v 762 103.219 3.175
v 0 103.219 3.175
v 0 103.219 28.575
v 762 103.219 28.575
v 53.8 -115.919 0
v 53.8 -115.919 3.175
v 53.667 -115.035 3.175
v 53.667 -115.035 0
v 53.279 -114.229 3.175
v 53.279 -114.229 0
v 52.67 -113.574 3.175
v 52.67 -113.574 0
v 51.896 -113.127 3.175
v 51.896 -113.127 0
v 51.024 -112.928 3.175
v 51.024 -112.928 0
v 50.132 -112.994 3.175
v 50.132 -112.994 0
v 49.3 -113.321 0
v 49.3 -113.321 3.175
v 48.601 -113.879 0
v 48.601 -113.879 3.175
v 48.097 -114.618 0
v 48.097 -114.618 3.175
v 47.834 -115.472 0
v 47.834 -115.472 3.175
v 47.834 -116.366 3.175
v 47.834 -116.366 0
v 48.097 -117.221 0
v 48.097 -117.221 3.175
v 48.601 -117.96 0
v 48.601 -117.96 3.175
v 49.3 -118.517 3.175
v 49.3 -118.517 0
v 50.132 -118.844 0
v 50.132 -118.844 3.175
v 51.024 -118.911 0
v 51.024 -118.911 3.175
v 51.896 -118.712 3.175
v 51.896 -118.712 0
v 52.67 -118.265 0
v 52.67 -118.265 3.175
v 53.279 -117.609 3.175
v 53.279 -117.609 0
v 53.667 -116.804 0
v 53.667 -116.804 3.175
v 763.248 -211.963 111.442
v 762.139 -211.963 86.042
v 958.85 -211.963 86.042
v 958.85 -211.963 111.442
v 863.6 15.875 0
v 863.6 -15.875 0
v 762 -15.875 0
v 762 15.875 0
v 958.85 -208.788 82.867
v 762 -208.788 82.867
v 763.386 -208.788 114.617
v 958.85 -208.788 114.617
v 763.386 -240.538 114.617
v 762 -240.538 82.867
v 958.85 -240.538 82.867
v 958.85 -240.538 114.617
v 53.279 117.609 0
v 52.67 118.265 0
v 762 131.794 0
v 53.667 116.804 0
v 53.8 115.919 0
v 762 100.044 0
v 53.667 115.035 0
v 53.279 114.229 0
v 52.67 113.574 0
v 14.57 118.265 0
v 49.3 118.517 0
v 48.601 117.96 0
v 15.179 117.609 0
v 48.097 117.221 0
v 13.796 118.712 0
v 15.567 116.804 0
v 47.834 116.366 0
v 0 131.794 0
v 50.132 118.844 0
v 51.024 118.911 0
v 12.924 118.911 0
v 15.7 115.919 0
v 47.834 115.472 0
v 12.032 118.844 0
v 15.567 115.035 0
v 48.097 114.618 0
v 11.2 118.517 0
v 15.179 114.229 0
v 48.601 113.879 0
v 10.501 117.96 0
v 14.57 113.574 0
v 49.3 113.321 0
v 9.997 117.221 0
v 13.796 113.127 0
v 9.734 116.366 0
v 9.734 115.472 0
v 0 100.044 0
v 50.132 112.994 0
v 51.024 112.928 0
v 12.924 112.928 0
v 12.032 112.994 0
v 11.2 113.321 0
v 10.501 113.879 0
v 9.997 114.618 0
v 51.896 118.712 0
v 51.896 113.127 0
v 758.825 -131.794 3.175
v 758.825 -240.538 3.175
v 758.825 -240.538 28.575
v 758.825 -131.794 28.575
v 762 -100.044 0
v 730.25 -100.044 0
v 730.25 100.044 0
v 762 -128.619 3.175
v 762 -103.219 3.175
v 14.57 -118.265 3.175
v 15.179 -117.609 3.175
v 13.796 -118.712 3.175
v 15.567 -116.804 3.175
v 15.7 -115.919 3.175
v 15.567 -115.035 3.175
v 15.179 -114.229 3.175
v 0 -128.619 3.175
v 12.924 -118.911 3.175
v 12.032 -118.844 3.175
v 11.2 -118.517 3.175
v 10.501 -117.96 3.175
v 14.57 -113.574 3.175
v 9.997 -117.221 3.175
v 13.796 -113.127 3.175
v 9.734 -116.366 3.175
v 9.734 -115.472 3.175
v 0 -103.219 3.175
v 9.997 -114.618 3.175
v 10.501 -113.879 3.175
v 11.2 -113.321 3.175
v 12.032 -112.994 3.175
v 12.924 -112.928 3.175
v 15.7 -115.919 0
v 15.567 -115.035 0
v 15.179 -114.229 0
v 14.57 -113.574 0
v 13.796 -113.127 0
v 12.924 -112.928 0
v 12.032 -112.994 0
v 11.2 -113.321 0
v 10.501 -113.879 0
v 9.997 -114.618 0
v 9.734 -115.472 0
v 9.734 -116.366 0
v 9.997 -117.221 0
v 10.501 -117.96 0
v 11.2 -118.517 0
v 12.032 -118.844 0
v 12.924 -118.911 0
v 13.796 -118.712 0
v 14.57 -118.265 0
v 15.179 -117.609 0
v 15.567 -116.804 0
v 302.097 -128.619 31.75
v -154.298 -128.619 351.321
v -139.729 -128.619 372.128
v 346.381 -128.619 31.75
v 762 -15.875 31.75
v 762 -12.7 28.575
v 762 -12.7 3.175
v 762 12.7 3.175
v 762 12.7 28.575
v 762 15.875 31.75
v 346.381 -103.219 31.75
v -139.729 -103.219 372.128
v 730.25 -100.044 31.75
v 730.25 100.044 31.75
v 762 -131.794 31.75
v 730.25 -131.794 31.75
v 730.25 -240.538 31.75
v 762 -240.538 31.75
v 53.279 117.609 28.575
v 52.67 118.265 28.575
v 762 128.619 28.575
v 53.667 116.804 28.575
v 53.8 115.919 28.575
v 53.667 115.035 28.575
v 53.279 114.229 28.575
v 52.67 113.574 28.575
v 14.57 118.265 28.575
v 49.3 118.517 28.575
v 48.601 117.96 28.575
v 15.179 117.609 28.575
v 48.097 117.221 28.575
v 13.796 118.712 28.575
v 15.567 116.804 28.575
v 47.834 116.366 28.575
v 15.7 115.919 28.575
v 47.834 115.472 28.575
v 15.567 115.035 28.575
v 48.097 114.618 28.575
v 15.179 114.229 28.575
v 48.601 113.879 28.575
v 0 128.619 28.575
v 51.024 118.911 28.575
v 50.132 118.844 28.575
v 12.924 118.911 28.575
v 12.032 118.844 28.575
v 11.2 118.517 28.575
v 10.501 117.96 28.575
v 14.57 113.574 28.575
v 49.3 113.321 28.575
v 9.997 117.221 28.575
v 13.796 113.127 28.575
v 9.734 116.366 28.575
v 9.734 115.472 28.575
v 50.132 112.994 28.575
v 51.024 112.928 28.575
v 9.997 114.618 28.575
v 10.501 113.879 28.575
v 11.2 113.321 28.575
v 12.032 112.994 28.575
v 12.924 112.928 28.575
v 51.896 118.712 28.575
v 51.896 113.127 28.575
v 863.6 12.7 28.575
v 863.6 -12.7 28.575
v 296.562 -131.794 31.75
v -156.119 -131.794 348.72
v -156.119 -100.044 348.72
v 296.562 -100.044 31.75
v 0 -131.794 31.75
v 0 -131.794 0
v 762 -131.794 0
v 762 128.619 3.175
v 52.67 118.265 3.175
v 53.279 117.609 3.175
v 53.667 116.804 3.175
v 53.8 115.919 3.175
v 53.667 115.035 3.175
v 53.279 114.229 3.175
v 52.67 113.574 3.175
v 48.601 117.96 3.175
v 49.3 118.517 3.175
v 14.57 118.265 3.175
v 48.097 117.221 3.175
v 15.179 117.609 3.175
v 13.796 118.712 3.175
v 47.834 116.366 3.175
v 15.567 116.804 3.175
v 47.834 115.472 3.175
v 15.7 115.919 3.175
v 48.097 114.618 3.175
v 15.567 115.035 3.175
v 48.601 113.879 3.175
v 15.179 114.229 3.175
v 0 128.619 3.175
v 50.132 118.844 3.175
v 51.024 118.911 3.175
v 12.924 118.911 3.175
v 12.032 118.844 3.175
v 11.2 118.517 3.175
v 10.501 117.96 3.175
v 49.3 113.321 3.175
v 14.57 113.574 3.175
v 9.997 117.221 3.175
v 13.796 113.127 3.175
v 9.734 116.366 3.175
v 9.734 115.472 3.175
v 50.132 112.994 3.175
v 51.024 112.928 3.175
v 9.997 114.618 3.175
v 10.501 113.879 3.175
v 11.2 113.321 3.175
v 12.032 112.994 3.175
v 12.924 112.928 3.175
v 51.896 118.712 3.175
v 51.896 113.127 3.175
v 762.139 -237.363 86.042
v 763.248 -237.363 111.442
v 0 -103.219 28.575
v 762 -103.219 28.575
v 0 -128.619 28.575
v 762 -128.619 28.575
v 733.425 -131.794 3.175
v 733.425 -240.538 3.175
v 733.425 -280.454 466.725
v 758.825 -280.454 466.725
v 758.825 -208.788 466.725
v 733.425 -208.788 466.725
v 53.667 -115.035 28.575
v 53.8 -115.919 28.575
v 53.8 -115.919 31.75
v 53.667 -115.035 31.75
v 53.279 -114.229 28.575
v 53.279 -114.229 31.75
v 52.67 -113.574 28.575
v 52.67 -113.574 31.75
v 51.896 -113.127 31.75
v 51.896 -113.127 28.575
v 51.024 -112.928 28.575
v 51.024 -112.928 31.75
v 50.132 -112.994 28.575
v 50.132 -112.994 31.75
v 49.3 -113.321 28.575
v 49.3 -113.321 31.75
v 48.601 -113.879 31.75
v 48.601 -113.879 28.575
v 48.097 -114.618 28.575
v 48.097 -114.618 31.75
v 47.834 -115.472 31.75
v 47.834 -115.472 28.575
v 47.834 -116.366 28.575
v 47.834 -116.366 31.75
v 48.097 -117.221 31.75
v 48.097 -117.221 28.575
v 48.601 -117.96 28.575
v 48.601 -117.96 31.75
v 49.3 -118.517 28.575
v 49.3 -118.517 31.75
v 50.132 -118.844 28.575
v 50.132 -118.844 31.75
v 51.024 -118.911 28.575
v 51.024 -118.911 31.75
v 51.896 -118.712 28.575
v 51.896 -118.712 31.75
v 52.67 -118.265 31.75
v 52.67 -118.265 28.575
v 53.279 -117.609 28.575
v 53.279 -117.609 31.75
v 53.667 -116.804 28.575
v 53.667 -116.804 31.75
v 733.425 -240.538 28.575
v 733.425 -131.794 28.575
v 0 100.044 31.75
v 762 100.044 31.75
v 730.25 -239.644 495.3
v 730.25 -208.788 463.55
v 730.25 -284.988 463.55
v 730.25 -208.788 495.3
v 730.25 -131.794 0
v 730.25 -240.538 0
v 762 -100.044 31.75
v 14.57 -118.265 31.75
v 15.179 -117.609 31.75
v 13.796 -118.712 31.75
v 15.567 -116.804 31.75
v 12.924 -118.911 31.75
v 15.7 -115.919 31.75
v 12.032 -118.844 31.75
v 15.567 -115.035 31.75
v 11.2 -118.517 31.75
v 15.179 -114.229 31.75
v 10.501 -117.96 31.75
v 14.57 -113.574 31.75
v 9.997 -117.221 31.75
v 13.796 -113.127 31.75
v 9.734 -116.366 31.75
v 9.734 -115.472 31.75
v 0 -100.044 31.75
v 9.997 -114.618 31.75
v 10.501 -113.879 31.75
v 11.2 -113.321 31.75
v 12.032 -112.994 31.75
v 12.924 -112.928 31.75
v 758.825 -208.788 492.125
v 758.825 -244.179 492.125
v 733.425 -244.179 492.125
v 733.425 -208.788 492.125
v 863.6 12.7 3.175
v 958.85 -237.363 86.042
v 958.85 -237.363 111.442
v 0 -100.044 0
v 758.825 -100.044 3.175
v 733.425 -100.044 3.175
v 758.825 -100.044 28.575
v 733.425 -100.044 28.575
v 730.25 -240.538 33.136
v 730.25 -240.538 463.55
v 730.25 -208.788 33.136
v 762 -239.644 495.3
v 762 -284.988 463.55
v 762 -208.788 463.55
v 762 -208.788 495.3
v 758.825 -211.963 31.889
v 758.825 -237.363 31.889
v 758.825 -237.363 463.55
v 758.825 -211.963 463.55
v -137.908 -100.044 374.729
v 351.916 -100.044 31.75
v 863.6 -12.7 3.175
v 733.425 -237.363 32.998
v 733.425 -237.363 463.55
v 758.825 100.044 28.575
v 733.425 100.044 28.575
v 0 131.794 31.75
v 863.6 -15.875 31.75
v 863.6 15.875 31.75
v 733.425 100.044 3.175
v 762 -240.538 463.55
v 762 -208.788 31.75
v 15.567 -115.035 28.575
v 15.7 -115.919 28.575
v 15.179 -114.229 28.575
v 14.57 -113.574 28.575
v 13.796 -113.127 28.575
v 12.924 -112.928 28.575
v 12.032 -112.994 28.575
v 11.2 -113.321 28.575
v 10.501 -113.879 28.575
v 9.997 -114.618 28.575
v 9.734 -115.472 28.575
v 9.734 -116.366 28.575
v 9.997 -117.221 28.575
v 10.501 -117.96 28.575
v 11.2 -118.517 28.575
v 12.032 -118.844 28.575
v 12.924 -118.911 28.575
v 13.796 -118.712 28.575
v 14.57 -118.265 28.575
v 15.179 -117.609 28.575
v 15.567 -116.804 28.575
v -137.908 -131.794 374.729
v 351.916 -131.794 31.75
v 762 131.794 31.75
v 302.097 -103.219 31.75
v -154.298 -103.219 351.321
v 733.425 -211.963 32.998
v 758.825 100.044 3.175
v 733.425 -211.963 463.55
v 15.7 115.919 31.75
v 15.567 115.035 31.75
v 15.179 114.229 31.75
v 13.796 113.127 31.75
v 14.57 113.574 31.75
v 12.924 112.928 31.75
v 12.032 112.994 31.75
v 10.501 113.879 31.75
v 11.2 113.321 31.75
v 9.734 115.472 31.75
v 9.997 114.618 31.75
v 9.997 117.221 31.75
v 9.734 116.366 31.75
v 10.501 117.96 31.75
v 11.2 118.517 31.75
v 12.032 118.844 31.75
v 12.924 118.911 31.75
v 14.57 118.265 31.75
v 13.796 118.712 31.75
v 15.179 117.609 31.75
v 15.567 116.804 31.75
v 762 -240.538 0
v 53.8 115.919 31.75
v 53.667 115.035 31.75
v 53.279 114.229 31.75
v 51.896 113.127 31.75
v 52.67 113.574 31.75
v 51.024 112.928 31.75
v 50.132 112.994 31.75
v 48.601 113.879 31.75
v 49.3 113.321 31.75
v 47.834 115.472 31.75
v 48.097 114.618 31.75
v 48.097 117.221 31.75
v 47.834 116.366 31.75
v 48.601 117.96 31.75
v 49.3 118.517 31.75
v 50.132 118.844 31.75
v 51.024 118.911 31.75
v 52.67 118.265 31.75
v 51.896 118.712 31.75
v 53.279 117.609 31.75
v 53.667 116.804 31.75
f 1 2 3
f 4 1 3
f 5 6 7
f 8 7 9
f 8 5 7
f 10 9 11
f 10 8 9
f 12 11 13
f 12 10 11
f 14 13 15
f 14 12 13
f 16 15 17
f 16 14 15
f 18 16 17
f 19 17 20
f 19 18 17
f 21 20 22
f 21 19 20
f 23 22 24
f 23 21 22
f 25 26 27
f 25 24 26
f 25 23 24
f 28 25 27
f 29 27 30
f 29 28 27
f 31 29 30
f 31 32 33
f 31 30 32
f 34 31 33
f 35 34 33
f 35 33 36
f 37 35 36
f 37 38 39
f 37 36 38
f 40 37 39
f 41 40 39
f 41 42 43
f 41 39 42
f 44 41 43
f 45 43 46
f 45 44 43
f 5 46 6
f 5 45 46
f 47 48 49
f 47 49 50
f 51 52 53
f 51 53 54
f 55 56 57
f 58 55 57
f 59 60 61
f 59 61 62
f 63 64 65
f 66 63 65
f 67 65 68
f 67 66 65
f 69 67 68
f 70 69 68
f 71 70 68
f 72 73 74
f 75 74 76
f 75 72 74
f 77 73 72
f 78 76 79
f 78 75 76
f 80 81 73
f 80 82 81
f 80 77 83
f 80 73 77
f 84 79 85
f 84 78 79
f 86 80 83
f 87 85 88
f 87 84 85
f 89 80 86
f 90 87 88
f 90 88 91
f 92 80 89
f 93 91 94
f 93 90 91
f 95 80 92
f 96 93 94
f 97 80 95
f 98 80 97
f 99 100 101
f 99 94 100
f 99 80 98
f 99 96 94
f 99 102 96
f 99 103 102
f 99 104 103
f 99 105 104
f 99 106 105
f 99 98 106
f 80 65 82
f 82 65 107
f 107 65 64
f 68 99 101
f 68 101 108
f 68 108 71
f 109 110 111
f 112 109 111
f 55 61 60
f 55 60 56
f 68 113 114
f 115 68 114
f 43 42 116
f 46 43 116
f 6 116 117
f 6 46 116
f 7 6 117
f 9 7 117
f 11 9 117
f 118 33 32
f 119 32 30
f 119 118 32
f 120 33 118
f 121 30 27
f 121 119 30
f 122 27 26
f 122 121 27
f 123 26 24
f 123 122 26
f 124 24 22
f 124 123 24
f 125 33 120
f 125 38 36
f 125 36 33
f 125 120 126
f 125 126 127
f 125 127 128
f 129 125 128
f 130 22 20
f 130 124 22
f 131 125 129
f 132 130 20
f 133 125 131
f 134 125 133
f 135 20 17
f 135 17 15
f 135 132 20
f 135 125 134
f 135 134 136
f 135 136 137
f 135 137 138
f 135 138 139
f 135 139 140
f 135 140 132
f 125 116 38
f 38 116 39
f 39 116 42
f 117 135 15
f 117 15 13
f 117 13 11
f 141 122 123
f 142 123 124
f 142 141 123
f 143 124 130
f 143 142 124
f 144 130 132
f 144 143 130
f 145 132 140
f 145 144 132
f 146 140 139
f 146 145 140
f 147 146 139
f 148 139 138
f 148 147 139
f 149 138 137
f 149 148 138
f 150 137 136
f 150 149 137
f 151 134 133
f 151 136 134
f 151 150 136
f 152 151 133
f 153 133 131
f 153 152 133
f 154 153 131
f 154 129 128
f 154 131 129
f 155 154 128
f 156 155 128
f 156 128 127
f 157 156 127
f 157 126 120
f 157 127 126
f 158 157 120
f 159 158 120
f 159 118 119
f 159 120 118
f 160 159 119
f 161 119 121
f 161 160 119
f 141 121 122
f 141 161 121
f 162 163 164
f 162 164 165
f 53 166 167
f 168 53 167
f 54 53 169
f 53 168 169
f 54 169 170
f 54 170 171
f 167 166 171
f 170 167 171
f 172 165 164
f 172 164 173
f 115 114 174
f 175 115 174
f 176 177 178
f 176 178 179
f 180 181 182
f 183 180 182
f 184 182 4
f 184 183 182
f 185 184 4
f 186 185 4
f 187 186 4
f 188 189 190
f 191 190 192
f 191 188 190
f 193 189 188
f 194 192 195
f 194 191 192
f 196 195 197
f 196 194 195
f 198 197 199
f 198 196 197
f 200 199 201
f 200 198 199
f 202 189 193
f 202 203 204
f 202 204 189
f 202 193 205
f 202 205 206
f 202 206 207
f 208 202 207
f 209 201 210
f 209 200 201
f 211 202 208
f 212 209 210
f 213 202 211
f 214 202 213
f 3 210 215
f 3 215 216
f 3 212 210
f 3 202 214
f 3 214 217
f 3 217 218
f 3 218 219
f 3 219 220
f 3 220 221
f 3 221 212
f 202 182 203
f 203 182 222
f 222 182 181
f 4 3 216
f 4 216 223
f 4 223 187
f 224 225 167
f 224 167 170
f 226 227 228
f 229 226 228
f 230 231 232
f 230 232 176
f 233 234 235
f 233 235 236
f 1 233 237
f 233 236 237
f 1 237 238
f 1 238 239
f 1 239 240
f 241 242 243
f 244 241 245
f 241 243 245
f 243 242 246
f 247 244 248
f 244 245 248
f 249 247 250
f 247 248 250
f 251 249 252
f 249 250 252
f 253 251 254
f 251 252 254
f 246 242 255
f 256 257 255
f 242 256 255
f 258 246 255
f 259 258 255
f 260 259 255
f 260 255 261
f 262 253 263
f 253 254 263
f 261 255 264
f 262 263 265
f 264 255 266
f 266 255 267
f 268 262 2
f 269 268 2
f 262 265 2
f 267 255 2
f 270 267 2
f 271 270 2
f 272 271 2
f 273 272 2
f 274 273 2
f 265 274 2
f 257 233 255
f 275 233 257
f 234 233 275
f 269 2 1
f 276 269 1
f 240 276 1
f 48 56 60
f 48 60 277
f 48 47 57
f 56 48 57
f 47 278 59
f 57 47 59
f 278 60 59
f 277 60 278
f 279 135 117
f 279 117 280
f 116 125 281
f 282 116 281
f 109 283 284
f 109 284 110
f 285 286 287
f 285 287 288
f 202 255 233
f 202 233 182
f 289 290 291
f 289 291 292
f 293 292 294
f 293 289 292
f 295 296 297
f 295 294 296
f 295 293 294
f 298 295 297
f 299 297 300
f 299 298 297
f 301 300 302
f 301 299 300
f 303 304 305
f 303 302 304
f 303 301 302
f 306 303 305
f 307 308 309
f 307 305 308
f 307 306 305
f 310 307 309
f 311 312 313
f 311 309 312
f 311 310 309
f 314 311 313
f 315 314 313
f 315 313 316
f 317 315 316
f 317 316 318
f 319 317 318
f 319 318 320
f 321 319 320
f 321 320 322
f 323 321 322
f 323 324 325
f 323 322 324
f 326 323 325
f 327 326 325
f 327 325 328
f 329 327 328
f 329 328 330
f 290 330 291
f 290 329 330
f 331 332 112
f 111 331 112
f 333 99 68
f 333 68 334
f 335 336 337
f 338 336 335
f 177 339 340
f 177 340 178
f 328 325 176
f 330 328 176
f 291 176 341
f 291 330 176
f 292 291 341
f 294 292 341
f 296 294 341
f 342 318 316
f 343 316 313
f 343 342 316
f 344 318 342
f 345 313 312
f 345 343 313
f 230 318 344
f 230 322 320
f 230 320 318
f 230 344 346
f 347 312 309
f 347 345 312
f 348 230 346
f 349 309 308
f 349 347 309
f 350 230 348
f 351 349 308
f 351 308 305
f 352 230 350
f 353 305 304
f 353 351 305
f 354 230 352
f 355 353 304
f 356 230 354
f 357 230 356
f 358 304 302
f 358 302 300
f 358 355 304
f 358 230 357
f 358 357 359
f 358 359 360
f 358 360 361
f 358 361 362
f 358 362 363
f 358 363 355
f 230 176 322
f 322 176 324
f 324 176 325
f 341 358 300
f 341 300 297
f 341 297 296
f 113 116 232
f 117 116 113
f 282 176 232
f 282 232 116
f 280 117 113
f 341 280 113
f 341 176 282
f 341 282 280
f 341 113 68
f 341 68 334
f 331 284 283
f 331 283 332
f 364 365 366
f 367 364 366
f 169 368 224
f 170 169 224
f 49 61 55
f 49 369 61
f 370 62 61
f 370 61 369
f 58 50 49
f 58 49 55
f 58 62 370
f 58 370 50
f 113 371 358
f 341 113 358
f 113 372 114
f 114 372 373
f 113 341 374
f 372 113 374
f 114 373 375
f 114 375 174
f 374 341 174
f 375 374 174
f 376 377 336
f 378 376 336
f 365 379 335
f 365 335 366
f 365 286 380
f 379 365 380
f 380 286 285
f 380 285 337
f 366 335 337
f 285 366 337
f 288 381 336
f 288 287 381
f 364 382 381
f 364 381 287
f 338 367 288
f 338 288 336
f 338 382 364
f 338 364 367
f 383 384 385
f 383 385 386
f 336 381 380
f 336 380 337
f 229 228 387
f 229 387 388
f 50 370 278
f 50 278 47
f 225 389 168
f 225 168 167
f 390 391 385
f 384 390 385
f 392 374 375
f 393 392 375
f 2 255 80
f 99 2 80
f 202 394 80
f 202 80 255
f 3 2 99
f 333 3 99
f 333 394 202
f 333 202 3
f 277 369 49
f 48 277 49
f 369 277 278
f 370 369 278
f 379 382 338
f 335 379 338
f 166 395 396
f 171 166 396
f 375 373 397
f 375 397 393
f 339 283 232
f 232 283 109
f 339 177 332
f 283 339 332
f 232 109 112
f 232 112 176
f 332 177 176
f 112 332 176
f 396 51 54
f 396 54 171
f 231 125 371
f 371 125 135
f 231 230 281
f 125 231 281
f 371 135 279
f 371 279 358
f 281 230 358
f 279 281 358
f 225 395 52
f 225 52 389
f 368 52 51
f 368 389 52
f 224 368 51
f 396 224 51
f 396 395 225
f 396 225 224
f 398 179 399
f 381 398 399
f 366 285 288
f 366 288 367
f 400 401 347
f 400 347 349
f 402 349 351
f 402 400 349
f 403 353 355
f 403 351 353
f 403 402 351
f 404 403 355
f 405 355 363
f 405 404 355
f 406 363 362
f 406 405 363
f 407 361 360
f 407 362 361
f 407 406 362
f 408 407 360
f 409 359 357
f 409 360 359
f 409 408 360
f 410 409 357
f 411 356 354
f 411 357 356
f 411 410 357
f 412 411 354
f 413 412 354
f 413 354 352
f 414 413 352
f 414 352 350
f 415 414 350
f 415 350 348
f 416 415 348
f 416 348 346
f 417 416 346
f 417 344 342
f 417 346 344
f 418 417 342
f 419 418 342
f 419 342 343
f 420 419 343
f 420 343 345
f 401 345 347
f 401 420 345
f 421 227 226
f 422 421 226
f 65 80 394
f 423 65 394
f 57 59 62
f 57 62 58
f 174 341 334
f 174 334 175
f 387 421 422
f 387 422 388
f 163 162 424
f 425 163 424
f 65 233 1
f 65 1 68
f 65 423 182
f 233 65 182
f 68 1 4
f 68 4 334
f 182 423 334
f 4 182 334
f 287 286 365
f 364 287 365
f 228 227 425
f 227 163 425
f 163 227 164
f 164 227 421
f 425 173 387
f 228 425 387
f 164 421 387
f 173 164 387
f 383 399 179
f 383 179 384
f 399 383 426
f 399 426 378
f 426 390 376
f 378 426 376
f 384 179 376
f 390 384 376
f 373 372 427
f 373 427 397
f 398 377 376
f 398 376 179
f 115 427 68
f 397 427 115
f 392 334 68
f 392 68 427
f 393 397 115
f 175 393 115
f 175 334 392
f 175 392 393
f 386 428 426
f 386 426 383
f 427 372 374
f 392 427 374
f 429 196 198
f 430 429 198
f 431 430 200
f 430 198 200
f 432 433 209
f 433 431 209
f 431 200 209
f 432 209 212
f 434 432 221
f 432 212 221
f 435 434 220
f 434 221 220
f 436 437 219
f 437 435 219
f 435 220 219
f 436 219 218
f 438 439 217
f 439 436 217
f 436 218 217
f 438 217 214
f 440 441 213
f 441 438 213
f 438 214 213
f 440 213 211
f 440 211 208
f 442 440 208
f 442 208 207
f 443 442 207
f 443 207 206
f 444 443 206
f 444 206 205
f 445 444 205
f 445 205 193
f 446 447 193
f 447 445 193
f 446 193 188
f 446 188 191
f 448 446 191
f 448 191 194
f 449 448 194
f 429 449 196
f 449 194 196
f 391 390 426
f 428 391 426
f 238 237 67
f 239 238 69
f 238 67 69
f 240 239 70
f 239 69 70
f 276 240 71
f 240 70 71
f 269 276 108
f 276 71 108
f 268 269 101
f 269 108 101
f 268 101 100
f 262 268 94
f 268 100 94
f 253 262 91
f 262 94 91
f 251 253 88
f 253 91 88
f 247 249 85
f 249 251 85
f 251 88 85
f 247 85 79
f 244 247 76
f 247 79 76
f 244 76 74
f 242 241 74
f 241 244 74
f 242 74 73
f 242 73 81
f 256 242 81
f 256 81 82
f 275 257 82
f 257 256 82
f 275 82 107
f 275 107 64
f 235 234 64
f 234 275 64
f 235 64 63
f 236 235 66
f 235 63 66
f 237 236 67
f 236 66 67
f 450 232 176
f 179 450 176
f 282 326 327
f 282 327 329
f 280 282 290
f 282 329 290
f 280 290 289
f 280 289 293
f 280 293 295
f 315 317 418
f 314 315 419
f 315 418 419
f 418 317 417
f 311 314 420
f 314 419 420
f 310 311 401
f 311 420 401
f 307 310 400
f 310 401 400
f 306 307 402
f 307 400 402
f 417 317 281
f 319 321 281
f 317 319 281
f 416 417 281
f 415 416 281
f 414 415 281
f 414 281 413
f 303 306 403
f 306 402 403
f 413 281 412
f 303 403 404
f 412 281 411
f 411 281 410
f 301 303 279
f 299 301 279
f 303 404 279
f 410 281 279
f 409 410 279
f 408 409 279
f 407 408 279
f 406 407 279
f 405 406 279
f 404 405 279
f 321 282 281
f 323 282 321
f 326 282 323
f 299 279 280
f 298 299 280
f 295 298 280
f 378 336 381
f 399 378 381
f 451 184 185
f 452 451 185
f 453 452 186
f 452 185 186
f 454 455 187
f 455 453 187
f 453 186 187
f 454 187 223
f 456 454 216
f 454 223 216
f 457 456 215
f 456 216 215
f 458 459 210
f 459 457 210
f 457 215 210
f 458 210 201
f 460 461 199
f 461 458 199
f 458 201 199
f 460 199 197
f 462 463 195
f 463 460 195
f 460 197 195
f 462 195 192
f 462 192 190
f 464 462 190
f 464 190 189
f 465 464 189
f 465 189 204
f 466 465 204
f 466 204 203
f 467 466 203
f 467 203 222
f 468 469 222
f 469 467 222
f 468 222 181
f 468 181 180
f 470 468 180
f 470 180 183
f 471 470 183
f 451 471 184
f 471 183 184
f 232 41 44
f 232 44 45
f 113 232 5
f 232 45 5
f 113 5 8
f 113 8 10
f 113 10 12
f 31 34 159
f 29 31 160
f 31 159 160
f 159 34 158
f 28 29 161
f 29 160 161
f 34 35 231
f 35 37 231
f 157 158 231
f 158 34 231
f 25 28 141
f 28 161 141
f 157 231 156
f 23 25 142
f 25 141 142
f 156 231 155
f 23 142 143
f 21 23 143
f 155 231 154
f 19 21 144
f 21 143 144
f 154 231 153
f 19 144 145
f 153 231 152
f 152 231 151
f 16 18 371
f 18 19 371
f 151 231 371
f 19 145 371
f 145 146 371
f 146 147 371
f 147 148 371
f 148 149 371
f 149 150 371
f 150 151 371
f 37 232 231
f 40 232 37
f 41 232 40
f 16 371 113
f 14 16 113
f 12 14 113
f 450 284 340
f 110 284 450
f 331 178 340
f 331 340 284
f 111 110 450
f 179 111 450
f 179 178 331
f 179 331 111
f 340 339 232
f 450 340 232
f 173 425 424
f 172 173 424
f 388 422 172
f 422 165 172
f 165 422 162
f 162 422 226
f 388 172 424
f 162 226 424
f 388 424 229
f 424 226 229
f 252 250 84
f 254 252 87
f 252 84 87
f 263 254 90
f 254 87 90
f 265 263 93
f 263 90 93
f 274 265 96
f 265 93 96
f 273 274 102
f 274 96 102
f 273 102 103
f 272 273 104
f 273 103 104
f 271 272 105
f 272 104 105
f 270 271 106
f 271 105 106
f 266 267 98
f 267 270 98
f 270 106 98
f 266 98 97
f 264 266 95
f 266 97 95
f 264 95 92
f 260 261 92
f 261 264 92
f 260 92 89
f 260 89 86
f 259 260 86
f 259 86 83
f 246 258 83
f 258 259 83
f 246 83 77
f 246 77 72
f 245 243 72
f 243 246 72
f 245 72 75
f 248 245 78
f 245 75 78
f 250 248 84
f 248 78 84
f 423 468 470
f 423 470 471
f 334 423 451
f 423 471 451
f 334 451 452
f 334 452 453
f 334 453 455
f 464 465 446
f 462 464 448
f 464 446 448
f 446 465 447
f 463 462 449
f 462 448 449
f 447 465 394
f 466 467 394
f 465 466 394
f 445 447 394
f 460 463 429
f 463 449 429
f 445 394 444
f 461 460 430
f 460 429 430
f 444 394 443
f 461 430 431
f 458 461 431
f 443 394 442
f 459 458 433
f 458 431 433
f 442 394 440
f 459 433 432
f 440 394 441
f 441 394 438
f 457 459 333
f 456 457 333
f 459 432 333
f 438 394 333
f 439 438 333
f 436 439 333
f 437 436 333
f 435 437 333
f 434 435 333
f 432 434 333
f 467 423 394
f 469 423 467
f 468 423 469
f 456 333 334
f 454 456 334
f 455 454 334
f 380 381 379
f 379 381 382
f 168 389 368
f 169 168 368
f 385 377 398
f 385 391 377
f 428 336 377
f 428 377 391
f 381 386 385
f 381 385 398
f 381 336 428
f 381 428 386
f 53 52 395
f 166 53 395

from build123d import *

# Parameters (mm, degrees)
F0_W      = 31.75
F0_H      = 31.75
F0_W_2    = 25.4
F0_H_2    = 25.4
F1_DEPTH  = 762
F2_R      = 3
F3_DEPTH  = 31.751
F5_W      = 31.75
F5_H      = 31.75
F5_W_2    = 25.4
F5_H_2    = 25.4
F6_DEPTH  = 200.0885
F7_W      = 31.75
F7_H      = 31.75
F7_W_2    = 25.4
F7_H_2    = 25.4
F8_DEPTH  = 101.6
F9_W      = 31.75
F9_H      = 31.75
F9_W_2    = 25.4
F9_H_2    = 25.4
F10_DEPTH = 108.74375
F11_W     = 31.75
F11_H     = 31.75
F11_W_2   = 25.4
F11_H_2   = 25.4
F12_DEPTH = 431.8
F14_DEPTH = 60.706
F15_W     = 31.75
F15_H     = 31.75
F15_W_2   = 25.4
F15_H_2   = 25.4
F16_DEPTH = 76.2
F18_DEPTH = 133.351
F20_W     = 31.75
F20_H     = 31.75
F20_W_2   = 25.4
F20_H_2   = 25.4
F21_DEPTH = 196.85
F23_DEPTH = 41.402
F25_W     = 31.75
F25_H     = 31.75
F25_W_2   = 25.4
F25_H_2   = 25.4


with BuildPart() as f1:
    # F0 (on Right) → F1 (new body)
    with BuildSketch(Plane.YZ):
        with Locations((-115.91925, 15.875)):
            Rectangle(F0_W, F0_H)
        with Locations((-115.91925, 15.875)):
            Rectangle(F0_W_2, F0_H_2, mode=Mode.SUBTRACT)
    extrude(amount=F1_DEPTH)

    # F2 (on Top) → F3 (cut, through all)
    with BuildSketch(Plane.XY):
        with Locations((12.7, -115.91925)):
            Circle(F2_R)
        with Locations((50.8, -115.91925)):
            Circle(F2_R)
    extrude(amount=F3_DEPTH, mode=Mode.SUBTRACT)


with BuildPart() as f4_1:
    # F4: instance of F1
    add(f1.part.mirror(Plane.XZ))


with BuildPart() as f6:
    # F5 (on face) → F6 (new body, through all)
    with BuildSketch(Plane(origin=(0, -100.04425, 0), x_dir=(-1, 0, 0), z_dir=(0, 1, 0))):
        with Locations((-746.125, 15.875)):
            Rectangle(F5_W, F5_H)
        with Locations((-746.125, 15.875)):
            Rectangle(F5_W_2, F5_H_2, mode=Mode.SUBTRACT)
    extrude(amount=F6_DEPTH)


with BuildPart() as f8:
    # F7 (on face) → F8 (new body)
    with BuildSketch(Plane.YZ.offset(762)):
        with Locations((0, 15.875)):
            Rectangle(F7_W, F7_H)
        with Locations((0, 15.875)):
            Rectangle(F7_W_2, F7_H_2, mode=Mode.SUBTRACT)
    extrude(amount=F8_DEPTH)


with BuildPart() as f10:
    # F9 (on face) → F10 (new body)
    with BuildSketch(Plane.XZ.offset(131.79425)):
        with Locations((746.125, 15.875)):
            Rectangle(F9_W, F9_H)
        with Locations((746.125, 15.875)):
            Rectangle(F9_W_2, F9_H_2, mode=Mode.SUBTRACT)
    extrude(amount=F10_DEPTH)


with BuildPart() as f12:
    # F11 (on face) → F12 (new body)
    with BuildSketch(Plane.XY.offset(31.75)):
        with Locations((746.125, -224.663)):
            Rectangle(F11_W, F11_H)
        with Locations((746.125, -224.663)):
            Rectangle(F11_W_2, F11_H_2, mode=Mode.SUBTRACT)
    extrude(amount=F12_DEPTH)

    # F13 (on face) → F14 (cut)
    with BuildSketch(Plane.XZ.offset(240.538)):
        Polygon((730.25, 31.75), (762, 31.75), (730.25, 33.1362349373), align=None)
    extrude(amount=-F14_DEPTH, mode=Mode.SUBTRACT)


with BuildPart() as f16:
    # F15 (on face) → F16 (new body)
    with BuildSketch(Plane(origin=(0, -208.788, 0), x_dir=(-1, 0, 0), z_dir=(0, 1, 0))):
        with Locations((-746.125, 479.425)):
            Rectangle(F15_W, F15_H)
        with Locations((-746.125, 479.425)):
            Rectangle(F15_W_2, F15_H_2, mode=Mode.SUBTRACT)
    extrude(amount=-F16_DEPTH)

    # F17 (on face) → F18 (cut, through all)
    with BuildSketch(Plane(origin=(730.25, 0, 0), x_dir=(0, -1, 0), z_dir=(-1, 0, 0))):
        Polygon((239.6443007859, 495.3), (284.988, 463.55), (284.988, 495.3), align=None)
    extrude(amount=-F18_DEPTH, mode=Mode.SUBTRACT)


with BuildPart() as f21:
    # F20 (on face) → F21 (new body)
    with BuildSketch(Plane.YZ.offset(762)):
        with Locations((-224.663, 98.7415569425)):
            Rectangle(F20_W, F20_H)
        with Locations((-224.663, 98.7415569425)):
            Rectangle(F20_W_2, F20_H_2, mode=Mode.SUBTRACT)
    extrude(amount=F21_DEPTH)

    # F22 (on face) → F23 (cut)
    with BuildSketch(Plane.XZ.offset(240.538)):
        Polygon((762, 114.6165569425), (762, 82.8665569425), (763.3862349373, 114.6165569425), align=None)
    extrude(amount=-F23_DEPTH, mode=Mode.SUBTRACT)


with BuildPart() as f26:
    # F25 (on line) → F26 (new body, up to the next surface of F1)
    with BuildSketch(Plane(origin=(-268.6025501382, 0, 188.0775303891), x_dir=(0, 1, 0), z_dir=(0.8191520443, 0, -0.5735764364))):
        with Locations((-115.91925, 211.9838086831)):
            Rectangle(F25_W, F25_H)
        with Locations((-115.91925, 211.9838086831)):
            Rectangle(F25_W_2, F25_H_2, mode=Mode.SUBTRACT)
    extrude(until=Until.NEXT, target=f1.part)


solid = Compound([f1.part, f4_1.part, f6.part, f8.part, f10.part, f12.part, f16.part, f21.part, f26.part])
